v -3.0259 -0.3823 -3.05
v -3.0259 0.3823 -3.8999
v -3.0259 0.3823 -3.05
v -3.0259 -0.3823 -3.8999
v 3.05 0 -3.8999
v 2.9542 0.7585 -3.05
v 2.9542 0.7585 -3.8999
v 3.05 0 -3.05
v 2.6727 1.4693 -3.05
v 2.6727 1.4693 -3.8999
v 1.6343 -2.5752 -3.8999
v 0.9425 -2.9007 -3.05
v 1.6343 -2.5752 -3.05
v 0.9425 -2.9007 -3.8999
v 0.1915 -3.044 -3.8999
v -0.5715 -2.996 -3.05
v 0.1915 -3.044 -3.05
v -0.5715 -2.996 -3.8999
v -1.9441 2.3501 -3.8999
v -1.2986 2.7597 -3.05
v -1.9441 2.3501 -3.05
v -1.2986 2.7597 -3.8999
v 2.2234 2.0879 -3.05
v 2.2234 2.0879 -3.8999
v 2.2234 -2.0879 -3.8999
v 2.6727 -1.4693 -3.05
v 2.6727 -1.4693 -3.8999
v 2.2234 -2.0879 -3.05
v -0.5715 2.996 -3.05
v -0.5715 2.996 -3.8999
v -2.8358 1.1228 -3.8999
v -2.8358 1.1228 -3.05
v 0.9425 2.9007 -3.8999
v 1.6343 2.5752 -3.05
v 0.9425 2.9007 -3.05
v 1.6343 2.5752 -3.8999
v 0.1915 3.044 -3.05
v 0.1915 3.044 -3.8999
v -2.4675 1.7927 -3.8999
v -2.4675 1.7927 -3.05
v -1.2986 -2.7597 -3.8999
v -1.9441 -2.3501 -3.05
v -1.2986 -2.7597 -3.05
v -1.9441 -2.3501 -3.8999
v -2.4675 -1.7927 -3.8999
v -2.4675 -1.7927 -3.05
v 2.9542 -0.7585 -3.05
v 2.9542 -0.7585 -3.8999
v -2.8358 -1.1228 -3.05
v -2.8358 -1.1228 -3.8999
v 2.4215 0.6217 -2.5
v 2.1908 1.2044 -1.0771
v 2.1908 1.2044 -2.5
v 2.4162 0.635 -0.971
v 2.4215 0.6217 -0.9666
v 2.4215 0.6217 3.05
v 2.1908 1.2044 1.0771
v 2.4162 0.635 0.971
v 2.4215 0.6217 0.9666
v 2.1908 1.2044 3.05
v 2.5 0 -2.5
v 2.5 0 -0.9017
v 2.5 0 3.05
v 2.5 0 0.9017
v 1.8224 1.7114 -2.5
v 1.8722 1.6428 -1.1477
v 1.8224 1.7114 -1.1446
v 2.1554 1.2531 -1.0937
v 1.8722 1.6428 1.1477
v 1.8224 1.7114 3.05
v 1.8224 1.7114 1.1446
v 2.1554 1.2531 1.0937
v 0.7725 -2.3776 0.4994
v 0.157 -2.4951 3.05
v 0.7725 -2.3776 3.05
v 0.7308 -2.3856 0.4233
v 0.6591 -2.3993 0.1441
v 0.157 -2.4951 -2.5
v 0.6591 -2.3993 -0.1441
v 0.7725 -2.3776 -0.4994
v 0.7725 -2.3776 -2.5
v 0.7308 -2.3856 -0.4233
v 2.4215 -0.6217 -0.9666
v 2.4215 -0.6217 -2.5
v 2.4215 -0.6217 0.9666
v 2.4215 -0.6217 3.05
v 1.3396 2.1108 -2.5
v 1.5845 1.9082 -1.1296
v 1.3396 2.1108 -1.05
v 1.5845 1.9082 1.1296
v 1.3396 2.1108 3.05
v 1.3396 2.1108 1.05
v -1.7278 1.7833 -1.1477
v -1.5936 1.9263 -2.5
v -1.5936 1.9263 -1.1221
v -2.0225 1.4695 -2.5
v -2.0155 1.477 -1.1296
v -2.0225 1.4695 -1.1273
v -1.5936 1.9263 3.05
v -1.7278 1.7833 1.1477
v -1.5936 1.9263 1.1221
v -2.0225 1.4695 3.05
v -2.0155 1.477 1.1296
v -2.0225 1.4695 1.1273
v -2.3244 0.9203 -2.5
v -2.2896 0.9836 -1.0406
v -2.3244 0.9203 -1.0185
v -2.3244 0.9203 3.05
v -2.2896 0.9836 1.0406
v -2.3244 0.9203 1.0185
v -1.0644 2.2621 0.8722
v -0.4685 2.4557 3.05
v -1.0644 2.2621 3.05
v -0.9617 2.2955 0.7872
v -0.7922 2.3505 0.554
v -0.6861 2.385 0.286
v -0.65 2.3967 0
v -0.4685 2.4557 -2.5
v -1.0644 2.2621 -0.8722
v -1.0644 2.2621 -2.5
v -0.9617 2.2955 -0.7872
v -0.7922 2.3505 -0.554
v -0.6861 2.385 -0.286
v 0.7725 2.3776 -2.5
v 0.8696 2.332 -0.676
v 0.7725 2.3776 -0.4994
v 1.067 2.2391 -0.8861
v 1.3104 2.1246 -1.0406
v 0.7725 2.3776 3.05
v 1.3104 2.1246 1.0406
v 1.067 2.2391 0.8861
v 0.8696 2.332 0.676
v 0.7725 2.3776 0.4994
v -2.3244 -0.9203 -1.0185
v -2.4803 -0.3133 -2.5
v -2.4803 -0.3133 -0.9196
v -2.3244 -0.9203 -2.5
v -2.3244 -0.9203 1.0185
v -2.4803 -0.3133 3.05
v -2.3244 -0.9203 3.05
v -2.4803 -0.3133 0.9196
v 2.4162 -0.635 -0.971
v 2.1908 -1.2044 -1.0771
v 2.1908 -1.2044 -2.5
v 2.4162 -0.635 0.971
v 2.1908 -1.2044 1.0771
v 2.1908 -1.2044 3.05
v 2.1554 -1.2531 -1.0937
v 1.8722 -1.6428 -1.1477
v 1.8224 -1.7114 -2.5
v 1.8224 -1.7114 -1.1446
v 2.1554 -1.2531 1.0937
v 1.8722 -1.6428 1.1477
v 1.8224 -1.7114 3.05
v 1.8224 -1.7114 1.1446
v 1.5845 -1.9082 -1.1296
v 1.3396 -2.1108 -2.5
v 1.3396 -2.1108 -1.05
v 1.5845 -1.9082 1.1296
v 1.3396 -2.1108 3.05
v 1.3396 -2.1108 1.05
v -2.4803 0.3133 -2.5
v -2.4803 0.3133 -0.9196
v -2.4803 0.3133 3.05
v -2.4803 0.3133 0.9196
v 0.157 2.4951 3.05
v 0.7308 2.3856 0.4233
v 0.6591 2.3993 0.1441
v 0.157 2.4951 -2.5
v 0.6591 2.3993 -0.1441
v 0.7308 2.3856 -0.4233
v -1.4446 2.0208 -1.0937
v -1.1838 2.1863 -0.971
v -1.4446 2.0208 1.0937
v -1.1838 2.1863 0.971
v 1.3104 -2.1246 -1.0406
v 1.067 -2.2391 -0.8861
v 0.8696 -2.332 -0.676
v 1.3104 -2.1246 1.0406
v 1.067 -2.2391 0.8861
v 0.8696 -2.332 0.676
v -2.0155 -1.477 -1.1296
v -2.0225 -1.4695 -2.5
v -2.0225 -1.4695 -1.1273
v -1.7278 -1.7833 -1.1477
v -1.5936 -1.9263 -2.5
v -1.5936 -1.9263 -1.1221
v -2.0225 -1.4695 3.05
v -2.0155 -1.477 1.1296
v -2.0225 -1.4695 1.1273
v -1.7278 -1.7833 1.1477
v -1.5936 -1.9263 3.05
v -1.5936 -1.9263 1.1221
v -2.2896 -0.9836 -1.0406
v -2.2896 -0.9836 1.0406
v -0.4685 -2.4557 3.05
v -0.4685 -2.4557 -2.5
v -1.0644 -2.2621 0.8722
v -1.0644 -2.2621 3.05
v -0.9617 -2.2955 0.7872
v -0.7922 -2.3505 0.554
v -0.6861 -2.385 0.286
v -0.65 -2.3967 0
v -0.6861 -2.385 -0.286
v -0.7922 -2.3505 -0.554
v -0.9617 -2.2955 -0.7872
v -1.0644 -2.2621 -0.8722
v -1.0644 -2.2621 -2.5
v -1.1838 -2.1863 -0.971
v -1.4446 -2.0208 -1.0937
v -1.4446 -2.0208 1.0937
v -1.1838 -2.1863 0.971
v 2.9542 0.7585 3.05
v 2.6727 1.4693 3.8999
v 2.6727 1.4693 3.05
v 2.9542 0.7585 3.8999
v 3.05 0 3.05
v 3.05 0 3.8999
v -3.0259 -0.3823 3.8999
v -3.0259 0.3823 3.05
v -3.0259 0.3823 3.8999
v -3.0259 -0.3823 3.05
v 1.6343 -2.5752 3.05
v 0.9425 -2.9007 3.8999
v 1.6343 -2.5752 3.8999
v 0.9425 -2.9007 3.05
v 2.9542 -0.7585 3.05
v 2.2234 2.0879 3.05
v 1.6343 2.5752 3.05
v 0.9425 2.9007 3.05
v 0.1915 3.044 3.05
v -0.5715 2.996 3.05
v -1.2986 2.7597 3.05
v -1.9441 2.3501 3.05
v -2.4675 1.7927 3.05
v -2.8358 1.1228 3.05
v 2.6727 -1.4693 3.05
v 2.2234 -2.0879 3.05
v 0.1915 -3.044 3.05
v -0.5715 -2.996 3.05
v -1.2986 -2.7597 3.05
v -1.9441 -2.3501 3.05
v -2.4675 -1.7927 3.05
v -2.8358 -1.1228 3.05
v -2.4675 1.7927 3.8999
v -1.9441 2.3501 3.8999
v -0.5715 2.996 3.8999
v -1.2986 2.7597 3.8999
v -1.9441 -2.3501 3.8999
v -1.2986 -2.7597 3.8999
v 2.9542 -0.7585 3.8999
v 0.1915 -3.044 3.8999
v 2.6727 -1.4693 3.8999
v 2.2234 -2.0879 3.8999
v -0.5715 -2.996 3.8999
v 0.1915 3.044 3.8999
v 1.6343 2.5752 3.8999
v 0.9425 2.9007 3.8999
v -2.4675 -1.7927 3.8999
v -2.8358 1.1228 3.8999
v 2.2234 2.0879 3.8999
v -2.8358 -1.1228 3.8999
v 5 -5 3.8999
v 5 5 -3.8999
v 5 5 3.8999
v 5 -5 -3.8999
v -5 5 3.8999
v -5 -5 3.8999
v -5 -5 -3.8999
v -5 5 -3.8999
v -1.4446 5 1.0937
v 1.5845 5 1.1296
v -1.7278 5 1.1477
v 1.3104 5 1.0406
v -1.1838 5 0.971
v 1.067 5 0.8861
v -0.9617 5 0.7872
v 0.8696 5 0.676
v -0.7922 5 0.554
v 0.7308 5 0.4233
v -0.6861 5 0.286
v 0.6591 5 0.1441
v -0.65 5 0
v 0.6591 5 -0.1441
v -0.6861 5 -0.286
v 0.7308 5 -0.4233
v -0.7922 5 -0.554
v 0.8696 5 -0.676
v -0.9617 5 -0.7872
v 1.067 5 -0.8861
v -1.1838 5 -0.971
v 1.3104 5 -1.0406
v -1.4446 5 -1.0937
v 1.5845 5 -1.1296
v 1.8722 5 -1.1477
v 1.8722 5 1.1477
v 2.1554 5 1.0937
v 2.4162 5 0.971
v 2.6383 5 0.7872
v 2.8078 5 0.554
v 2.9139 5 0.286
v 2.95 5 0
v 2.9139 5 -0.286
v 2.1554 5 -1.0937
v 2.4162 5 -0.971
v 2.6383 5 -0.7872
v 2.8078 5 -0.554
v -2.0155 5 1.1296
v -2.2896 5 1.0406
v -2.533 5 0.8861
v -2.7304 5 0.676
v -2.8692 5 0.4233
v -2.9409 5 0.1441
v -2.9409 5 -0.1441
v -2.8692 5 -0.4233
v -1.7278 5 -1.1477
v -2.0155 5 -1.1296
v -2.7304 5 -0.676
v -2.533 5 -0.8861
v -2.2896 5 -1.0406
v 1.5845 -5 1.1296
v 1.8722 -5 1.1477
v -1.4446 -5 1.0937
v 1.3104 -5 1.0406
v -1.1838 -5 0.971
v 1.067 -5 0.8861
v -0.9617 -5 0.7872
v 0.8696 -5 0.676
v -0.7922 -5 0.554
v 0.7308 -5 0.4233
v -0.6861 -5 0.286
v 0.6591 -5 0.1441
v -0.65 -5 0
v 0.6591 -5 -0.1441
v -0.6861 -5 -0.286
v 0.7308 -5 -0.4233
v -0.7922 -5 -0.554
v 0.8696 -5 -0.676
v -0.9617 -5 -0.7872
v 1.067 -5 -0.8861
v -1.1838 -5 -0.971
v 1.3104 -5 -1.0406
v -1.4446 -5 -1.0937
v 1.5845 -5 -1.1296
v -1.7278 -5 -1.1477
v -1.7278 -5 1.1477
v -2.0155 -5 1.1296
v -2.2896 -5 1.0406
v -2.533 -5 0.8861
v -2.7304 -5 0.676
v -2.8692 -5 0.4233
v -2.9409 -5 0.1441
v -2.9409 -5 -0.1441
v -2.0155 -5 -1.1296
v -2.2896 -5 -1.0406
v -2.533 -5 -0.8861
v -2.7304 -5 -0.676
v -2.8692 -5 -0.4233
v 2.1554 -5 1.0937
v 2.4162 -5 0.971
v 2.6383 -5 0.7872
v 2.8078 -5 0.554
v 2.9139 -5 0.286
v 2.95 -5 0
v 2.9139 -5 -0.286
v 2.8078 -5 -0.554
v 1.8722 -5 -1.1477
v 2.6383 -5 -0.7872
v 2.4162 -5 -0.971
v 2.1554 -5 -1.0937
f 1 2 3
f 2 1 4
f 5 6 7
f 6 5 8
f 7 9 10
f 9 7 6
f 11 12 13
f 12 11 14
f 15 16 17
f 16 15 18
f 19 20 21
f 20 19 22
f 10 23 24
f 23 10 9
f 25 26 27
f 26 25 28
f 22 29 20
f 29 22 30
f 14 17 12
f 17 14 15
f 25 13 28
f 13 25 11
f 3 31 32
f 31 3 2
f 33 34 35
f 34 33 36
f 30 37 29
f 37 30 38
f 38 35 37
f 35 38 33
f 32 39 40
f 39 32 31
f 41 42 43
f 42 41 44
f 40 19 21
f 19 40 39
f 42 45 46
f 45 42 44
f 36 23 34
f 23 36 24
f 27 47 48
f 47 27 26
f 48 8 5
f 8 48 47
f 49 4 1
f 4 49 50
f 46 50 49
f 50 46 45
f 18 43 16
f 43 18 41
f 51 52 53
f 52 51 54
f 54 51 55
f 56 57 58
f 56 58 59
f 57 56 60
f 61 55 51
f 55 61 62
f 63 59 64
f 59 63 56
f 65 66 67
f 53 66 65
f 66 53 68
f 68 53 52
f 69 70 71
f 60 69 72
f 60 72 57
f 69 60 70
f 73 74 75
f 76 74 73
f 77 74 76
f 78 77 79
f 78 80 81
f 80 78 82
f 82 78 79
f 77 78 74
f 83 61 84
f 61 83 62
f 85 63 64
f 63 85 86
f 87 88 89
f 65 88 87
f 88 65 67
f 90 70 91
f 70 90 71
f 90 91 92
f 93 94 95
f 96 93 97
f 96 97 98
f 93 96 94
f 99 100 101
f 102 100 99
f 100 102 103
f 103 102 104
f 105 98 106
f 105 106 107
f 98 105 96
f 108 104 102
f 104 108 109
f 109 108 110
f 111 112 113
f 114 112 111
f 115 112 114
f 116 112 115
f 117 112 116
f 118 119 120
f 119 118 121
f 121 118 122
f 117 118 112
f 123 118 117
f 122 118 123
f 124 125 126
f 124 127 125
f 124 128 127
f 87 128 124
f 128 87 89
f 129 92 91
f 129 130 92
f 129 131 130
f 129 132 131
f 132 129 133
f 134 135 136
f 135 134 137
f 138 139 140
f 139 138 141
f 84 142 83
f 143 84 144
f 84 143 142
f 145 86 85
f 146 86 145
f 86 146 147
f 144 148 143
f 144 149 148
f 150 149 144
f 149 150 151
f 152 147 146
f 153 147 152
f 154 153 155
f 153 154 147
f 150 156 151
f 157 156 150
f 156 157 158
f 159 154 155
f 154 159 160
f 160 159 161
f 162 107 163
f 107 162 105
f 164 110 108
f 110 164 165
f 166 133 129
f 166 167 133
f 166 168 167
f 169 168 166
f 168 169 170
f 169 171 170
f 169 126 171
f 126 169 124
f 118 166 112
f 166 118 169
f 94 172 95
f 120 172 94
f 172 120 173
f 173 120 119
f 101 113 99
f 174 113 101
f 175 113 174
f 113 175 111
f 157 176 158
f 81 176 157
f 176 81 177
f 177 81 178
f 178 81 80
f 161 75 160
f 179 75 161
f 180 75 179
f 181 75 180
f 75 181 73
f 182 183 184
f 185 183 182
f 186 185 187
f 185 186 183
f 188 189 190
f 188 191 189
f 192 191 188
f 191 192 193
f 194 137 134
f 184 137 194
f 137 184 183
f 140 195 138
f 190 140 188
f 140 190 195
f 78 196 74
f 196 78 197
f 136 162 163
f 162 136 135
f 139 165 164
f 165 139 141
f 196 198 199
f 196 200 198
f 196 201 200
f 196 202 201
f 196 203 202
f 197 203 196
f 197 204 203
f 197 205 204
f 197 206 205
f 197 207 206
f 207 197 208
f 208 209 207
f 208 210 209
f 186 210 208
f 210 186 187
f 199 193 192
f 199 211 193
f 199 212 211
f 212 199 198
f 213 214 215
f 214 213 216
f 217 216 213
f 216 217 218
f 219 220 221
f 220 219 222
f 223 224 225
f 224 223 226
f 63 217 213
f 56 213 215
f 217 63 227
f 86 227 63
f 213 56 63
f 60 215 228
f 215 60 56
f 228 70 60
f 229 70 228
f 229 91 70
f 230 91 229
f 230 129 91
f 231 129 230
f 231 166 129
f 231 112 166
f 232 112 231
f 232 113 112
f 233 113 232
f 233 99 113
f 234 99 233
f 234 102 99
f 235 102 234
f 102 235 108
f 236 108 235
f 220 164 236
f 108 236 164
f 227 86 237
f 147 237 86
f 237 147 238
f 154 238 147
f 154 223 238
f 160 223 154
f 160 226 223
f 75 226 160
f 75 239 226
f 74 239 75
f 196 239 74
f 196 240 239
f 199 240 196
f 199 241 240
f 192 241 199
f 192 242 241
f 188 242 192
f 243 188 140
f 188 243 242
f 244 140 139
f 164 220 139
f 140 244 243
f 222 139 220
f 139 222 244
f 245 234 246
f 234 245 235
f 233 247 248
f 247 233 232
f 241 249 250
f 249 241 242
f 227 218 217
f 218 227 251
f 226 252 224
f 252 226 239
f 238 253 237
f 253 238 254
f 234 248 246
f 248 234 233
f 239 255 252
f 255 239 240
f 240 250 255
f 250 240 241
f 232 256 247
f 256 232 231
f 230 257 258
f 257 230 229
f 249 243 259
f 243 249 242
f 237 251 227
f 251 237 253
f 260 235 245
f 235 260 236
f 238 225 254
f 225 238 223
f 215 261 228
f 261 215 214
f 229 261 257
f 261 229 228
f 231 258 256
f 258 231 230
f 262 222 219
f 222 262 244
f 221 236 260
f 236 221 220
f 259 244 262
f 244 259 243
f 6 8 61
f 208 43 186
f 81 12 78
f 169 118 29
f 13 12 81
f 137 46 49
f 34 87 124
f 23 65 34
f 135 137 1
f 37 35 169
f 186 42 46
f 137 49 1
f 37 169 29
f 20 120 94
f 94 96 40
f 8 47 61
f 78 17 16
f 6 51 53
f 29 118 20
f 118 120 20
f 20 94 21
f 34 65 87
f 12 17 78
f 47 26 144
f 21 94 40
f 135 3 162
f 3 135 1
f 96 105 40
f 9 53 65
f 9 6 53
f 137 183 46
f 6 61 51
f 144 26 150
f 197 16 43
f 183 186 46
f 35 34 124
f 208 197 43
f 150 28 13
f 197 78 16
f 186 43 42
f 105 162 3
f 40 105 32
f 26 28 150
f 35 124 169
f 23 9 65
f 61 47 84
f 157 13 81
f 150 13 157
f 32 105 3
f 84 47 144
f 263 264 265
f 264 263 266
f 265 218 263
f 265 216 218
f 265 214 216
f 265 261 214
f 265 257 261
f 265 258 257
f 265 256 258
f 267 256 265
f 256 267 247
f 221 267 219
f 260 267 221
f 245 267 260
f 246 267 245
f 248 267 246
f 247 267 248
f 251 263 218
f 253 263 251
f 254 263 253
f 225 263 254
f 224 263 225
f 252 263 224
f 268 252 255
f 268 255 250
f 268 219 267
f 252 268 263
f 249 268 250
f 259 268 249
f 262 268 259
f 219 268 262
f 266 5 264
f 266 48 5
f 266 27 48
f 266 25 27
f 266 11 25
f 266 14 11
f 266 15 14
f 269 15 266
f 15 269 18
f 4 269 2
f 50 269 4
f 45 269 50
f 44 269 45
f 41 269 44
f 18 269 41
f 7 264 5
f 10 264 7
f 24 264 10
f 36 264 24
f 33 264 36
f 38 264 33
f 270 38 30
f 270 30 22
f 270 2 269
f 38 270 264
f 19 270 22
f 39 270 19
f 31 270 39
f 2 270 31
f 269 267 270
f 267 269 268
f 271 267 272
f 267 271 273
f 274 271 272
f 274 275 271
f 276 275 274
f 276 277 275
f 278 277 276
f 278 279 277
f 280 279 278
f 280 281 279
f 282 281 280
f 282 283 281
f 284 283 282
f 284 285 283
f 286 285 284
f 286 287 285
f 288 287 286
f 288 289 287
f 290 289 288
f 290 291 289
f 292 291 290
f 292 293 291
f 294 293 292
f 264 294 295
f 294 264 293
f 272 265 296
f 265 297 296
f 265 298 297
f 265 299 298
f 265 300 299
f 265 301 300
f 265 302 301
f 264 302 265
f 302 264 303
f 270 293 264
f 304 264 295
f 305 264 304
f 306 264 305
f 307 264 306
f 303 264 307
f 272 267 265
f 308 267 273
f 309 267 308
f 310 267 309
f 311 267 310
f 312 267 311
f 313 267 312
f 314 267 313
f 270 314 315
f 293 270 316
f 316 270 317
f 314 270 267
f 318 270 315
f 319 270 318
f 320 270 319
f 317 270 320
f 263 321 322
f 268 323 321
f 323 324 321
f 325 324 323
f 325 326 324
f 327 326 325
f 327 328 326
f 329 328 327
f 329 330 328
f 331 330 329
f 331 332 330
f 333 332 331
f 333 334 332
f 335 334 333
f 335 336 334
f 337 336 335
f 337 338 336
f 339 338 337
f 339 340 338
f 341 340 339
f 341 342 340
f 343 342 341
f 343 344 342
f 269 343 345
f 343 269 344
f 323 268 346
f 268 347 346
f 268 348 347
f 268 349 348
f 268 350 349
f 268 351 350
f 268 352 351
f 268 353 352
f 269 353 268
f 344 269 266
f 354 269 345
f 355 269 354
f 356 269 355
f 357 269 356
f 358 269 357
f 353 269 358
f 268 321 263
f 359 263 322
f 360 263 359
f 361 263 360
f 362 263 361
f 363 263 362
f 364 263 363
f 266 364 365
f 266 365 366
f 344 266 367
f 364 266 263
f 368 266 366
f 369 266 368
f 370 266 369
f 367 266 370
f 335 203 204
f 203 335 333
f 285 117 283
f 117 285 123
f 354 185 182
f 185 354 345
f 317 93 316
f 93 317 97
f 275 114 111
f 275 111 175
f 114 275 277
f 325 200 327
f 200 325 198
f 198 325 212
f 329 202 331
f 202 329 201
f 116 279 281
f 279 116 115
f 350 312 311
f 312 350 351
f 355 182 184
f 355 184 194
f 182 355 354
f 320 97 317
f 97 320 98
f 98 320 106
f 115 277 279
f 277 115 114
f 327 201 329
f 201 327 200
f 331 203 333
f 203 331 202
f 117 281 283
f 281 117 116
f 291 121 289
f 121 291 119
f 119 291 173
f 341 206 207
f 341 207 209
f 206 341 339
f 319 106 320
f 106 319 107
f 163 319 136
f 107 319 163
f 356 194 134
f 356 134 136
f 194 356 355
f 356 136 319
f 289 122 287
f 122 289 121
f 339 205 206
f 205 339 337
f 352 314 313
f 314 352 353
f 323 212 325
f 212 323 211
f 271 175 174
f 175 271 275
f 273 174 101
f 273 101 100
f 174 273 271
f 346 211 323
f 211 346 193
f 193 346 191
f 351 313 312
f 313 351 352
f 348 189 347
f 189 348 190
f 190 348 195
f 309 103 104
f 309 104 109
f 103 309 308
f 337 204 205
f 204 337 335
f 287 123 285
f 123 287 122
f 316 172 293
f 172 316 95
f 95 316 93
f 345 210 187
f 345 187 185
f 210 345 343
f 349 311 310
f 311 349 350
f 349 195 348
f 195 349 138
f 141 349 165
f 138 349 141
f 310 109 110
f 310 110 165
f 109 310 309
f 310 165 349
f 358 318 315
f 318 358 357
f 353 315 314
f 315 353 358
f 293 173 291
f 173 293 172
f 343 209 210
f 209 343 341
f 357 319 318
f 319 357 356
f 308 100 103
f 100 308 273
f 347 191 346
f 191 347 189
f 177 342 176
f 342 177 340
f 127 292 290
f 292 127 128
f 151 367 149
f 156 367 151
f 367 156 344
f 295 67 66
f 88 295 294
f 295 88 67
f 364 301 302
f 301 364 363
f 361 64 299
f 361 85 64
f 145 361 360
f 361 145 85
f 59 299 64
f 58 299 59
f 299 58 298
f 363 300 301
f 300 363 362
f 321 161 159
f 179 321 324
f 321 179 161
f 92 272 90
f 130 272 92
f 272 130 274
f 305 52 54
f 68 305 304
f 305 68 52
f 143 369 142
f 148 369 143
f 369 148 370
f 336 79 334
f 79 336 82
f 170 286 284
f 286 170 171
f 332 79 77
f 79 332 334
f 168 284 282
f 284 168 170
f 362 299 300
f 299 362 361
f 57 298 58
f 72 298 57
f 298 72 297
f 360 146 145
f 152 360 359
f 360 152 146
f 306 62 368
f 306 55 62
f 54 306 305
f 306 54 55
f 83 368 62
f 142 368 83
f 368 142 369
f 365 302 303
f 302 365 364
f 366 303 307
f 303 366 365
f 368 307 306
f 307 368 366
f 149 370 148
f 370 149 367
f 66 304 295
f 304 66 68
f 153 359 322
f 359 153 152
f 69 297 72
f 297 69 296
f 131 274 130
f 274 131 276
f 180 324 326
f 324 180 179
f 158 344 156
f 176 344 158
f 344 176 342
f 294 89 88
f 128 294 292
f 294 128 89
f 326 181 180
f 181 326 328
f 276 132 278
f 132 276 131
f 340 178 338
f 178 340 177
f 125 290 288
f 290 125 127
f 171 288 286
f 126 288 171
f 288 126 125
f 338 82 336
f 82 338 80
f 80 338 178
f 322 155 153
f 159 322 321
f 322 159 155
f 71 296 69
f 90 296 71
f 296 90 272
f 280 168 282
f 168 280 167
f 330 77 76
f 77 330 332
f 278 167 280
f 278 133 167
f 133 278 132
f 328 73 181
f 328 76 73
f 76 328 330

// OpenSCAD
// file: MakeHoles.scad
/*      
        Customizable Straight LEGO Technic Beam
        Based on Parametric LEGO Technic Beam by "projunk"
        www.thingiverse.com/thing:203935
        Modified by Steve Medwin
        January 2015
*/

// Parameters modified for best print on my Replicator 2 with PLA
Pitch = 8*1.0;
Radius1 = 5.0/2;
Radius2 = 6.1/2;
Height = 7.8*1.0;
Depth = 0.85*1.0;
Width = 7.3*1.0; 

// user parameters
// number of holes =
//Holes = 9; // [2:20]

module drawBeam(x)
{
        union()
	{
            for (i = [1:x])
            {
                translate([(i-1)*Pitch, Width/2,0]) 
                {
                    cylinder(r=Radius2,h=Depth);
                    cylinder(r=Radius1,h=Height);
                    
                    translate([0,0,Height-Depth]) 
                    cylinder(r=Radius2,h=Depth);
                    
                    translate([0,0,Depth])
                    cylinder(h=(Radius2 - Radius1), r1=Radius2, r2=Radius1);
                }
            }
        }
        
}
// main file
include <MakeHoles.scad>
shankD1 = 2.1;
shankD2 = 2.3; // winner
shankD3 = 2.4;
lH = -3.9;
lW = -3.65; 
$fn = 25;
 difference() {
        cube([10, 10, 7.7999], center = true);
     /*
        translate ([-10,0,0]) {
            rotate ([90,0,0]) {
                cylinder(50,d =  shankD1,center = true,$fn=renderComplexity);
            }
        }
        translate ([1,0,0]) {
            rotate ([90,0,0]) {
                cylinder(50,d =  shankD2,center = true,$fn=renderComplexity);
            }
        }
        translate ([10,0,0]) {
            rotate ([90,0,0]) {
                cylinder(50,d =  shankD3,center = true,$fn=renderComplexity);
            }
        }
     */
        translate ([0,lW,lH]) {drawBeam(1);}
        translate ([-1.8, 0, 0]) {
            rotate([90,0,0]){
                cylinder(10,d = 2.3,center = true);
            }
        }
        translate ([1.8, 0, 0]) {
            rotate([90,0,0]){
                cylinder(10,d = 2.3,center = true);
            }
    }
}
